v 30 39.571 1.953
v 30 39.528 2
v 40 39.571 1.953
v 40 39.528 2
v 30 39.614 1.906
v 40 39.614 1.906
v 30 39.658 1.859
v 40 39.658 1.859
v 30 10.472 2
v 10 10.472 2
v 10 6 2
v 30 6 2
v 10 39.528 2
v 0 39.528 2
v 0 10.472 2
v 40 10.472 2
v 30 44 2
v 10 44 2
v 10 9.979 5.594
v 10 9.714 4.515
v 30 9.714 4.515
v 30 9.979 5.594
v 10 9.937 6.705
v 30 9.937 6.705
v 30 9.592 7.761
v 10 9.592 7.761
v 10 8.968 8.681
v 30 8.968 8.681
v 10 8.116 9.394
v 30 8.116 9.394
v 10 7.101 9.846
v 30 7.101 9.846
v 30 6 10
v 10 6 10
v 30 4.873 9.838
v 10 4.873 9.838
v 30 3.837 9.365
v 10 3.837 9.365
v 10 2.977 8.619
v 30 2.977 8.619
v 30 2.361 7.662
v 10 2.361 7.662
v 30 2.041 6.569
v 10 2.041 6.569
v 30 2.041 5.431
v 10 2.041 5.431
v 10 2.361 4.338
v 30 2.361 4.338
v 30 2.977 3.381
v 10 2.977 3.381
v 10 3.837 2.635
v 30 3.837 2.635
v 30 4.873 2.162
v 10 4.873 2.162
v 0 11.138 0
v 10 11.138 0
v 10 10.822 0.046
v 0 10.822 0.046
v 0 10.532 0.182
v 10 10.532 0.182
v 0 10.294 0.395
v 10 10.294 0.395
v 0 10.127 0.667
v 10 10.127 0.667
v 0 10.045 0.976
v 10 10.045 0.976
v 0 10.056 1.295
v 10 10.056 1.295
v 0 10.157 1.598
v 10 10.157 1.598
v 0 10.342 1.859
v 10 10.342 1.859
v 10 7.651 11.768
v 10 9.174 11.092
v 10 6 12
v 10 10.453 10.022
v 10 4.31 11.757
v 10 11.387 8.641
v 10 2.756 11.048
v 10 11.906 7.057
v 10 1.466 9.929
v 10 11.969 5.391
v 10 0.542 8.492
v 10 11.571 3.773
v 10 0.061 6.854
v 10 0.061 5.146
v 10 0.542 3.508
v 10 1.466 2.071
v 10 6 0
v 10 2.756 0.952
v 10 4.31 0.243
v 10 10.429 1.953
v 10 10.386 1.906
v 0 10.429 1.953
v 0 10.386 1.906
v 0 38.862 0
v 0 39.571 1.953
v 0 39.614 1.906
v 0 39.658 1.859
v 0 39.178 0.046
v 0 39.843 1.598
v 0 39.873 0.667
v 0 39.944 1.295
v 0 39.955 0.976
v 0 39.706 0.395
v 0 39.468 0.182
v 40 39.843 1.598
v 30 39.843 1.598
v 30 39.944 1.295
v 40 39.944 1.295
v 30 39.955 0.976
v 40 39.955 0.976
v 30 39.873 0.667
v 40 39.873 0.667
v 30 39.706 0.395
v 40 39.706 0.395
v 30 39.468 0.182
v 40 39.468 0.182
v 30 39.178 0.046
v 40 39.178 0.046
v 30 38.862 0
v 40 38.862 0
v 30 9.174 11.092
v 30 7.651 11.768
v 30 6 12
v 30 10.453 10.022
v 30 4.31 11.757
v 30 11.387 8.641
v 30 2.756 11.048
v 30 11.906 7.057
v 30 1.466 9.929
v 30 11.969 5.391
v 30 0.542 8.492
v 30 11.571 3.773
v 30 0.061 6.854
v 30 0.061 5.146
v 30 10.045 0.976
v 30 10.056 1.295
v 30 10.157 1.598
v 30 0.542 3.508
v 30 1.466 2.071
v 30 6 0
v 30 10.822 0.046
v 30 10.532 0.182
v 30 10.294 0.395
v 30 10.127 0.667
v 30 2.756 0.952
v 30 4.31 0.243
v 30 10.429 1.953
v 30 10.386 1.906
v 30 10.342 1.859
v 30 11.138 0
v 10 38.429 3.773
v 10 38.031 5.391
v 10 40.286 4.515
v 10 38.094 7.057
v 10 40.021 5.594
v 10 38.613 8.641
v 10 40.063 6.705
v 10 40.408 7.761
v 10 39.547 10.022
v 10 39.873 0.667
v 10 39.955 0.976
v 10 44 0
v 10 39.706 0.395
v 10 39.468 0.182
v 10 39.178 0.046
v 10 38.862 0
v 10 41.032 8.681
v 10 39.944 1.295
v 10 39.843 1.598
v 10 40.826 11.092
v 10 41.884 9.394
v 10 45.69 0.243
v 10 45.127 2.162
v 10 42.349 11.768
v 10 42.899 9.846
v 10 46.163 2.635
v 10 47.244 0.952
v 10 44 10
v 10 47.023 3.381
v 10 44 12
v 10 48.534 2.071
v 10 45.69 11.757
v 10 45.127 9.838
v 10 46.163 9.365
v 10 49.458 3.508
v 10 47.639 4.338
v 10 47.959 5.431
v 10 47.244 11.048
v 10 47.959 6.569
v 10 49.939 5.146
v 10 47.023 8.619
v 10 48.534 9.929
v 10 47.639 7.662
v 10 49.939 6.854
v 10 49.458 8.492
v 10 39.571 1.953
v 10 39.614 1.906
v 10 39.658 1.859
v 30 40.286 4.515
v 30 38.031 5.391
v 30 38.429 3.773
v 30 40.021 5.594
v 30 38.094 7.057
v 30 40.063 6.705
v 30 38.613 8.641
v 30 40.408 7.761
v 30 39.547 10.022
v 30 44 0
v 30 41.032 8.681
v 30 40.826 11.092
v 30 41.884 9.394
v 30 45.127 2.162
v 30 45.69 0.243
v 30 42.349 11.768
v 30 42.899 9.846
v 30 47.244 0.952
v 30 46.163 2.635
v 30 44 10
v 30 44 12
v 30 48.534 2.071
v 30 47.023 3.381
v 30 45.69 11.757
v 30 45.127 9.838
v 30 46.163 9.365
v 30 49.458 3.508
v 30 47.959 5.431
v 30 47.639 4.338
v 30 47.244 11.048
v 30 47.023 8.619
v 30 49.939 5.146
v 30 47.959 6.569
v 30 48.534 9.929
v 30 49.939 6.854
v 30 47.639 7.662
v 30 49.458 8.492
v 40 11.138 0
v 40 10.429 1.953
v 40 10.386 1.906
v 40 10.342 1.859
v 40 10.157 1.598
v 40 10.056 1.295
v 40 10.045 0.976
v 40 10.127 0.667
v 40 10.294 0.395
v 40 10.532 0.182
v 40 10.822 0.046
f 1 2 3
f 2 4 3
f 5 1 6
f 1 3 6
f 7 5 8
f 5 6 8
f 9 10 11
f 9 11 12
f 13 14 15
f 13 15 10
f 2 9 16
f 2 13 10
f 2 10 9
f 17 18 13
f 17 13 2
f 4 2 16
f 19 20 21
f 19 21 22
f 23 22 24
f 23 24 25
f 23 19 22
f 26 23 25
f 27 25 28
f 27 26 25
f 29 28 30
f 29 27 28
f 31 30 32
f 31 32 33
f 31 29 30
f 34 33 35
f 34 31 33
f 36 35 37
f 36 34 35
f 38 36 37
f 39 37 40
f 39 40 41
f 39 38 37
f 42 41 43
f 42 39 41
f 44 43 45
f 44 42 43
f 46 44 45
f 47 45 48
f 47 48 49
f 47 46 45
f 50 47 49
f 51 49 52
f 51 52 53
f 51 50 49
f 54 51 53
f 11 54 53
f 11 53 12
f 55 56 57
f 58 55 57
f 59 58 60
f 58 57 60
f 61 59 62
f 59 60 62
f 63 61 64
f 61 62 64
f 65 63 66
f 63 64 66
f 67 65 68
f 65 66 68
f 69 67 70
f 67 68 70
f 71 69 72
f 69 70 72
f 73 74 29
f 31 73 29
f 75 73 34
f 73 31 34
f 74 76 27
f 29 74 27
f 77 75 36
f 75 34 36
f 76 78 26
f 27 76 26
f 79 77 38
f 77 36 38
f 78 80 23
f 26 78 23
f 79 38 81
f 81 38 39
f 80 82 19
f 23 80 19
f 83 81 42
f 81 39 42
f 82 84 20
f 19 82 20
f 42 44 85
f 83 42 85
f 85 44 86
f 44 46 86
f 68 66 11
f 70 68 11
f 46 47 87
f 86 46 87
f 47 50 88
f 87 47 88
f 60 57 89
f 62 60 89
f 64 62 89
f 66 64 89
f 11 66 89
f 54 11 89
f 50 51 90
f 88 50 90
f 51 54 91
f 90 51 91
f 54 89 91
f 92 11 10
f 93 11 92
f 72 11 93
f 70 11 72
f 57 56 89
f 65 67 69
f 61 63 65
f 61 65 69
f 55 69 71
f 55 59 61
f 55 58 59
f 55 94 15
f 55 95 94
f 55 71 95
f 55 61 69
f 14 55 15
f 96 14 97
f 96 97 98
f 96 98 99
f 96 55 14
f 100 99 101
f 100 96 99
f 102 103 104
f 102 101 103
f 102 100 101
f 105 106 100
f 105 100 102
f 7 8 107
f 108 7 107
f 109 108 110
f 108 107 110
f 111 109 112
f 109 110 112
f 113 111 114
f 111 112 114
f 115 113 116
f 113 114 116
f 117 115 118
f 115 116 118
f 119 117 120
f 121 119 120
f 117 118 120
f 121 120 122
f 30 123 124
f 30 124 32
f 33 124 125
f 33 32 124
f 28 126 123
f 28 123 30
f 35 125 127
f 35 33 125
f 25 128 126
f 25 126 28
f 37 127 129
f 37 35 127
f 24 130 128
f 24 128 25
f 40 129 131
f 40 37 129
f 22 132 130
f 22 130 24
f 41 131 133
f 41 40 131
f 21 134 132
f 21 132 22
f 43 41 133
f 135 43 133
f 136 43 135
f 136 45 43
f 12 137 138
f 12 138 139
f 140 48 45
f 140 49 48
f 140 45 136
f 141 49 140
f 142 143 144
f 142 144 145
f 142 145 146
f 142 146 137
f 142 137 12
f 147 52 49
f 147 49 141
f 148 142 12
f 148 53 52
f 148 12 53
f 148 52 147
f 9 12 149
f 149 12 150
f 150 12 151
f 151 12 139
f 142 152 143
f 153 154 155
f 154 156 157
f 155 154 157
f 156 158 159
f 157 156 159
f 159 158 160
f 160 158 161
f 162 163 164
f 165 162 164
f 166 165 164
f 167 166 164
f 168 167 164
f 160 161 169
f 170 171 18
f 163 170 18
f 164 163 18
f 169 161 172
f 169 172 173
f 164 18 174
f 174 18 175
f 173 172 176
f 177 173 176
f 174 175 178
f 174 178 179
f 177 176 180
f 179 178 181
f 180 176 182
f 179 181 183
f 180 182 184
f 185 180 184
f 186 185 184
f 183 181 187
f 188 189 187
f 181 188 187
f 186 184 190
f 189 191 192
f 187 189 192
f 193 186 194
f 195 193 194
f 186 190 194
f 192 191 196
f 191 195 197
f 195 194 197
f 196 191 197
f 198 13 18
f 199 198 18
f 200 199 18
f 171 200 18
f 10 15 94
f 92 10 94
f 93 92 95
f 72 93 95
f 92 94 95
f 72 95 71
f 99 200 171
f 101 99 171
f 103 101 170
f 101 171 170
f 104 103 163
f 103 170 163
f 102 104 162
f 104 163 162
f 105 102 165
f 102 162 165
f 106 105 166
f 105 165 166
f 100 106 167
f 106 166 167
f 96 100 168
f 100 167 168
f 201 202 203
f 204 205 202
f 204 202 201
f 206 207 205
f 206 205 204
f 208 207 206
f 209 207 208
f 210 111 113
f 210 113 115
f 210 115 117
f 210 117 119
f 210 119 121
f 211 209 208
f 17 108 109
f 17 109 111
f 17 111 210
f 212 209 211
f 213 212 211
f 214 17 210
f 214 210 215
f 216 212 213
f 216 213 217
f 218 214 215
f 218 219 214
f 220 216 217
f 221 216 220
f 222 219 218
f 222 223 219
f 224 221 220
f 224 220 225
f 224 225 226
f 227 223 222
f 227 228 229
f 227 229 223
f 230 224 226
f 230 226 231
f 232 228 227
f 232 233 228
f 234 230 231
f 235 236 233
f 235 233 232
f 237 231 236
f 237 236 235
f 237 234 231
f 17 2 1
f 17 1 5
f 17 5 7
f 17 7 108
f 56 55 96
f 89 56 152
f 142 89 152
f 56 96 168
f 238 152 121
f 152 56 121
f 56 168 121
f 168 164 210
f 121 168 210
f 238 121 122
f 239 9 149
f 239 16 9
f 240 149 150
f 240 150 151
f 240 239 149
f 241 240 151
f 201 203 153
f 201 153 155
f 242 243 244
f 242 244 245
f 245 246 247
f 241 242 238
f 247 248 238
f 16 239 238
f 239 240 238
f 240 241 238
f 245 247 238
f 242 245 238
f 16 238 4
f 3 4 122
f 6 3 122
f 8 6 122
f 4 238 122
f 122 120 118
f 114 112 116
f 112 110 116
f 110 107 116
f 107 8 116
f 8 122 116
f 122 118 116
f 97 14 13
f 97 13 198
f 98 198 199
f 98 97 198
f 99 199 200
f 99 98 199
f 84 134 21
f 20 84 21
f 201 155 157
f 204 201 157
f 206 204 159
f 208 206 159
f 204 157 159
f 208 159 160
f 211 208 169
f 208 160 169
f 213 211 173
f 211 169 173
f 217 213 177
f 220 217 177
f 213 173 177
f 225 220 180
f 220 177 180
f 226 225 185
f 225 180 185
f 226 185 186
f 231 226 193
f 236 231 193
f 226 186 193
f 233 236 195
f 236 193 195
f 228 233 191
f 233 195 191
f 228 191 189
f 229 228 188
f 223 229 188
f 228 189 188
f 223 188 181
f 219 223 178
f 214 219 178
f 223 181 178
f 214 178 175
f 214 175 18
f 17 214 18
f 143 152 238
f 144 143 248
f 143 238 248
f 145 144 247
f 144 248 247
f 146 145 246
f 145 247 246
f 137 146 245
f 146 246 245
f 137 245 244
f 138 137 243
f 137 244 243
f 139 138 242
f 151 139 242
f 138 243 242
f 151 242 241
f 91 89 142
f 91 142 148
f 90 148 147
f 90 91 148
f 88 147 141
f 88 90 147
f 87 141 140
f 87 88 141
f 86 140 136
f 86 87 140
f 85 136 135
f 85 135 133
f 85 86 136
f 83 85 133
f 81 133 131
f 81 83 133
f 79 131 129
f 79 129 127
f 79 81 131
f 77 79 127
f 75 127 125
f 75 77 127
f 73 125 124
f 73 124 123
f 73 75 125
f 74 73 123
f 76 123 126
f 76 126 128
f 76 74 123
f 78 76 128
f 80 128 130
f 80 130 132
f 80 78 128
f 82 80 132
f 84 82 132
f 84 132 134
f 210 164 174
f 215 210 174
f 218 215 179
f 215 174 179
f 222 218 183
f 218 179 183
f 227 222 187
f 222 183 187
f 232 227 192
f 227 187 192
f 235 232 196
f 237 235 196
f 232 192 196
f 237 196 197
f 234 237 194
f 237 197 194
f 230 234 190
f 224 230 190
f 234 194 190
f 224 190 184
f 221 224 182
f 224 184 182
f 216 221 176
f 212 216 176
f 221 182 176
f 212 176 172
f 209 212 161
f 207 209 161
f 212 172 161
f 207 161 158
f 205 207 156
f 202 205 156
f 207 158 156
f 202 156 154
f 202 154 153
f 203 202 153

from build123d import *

# Parameters (mm, degrees)
SKETCH1_W               = 40
SKETCH1_H               = 50
BOSS_EXTRUDE1_DEPTH     = 2
SKETCH3_W               = 40
SKETCH3_H               = 6
CUT_EXTRUDE3_DEPTH      = 3
SKETCH8_W               = 40
SKETCH8_H               = 6
CUT_EXTRUDE4_DEPTH      = 10
BOSS_EXTRUDE2_DEPTH     = 10
CUT_EXTRUDE5_START      = 10
SKETCH9_R               = 6
CUT_EXTRUDE5_DEPTH      = 10
MIRROR4_START           = 10
MIRROR4_COPY_1_SKETCH_R = 6
MIRROR4_COPY_1_DEPTH    = 10
FILLET1_R               = 1.1


with BuildPart() as part:
    # Sketch1 → Boss-Extrude1 (new body)
    with BuildSketch(Plane.XY):
        with Locations((20, 25)):
            Rectangle(SKETCH1_W, SKETCH1_H)
    extrude(amount=BOSS_EXTRUDE1_DEPTH)

    # Sketch3 → Cut-Extrude3 (cut)
    with BuildSketch(Plane.XY.offset(2)):
        with Locations((20, 3)):
            Rectangle(SKETCH3_W, SKETCH3_H)
    extrude(amount=-CUT_EXTRUDE3_DEPTH, mode=Mode.SUBTRACT)

    # Sketch8 → Cut-Extrude4 (cut)
    with BuildSketch(Plane.XY.offset(2)):
        with Locations((20, 47)):
            Rectangle(SKETCH8_W, SKETCH8_H)
    extrude(amount=-CUT_EXTRUDE4_DEPTH, mode=Mode.SUBTRACT)

    # Sketch6 → Boss-Extrude2 (add, symmetric)
    with BuildSketch(Plane(origin=(20, 0, -40), x_dir=(0, 0, 1), z_dir=(-1, 0, 0))):
        with BuildLine():
            Line((43.77260129, 11.571238192), (44.515067527, 9.714158794))
            ThreePointArc((44.515067527, 9.714158794), (48.242796258, 9.312078644), (50, 6))
            ThreePointArc((50, 6), (46, 2), (42, 6))
            Line((42, 6), (40, 6))
            ThreePointArc((40, 6), (46, 0), (52, 6))
            ThreePointArc((52, 6), (49.364194387, 10.968117966), (43.77260129, 11.571238192))
        make_face()
    boss_extrude2 = extrude(amount=BOSS_EXTRUDE2_DEPTH, both=True)

    # Mirror2: Boss-Extrude2 across plane
    add(boss_extrude2.mirror(Plane(origin=(0, 25, 0), x_dir=(0, 0, 1), z_dir=(0, -1, 0))))

    # Sketch9 → Cut-Extrude5 (cut)
    with BuildSketch(Plane.ZY.offset(-10).offset(CUT_EXTRUDE5_START)):
        with Locations((6, 6)):
            Circle(SKETCH9_R)
    cut_extrude5 = extrude(amount=-CUT_EXTRUDE5_DEPTH, mode=Mode.SUBTRACT)

    # Mirror3: Cut-Extrude5 across plane
    add(cut_extrude5.mirror(Plane(origin=(20, 0, 0), x_dir=(0, 0, 1), z_dir=(1, 0, 0))), mode=Mode.SUBTRACT)

    # Mirror4: Cut-Extrude5 across plane
    add(cut_extrude5.mirror(Plane(origin=(0, 25, 0), x_dir=(0, 0, 1), z_dir=(0, -1, 0))), mode=Mode.SUBTRACT)

    # Mirror4 copy 1 sketch → Mirror4 copy 1 (cut)
    with BuildSketch(Plane(origin=(30, 50, 0), x_dir=(0, 0, 1), z_dir=(1, 0, 0)).offset(MIRROR4_START)):
        with Locations((6, 6)):
            Circle(MIRROR4_COPY_1_SKETCH_R)
    extrude(amount=-MIRROR4_COPY_1_DEPTH, mode=Mode.SUBTRACT)

    # Fillet1
    # the kernel refuses this fillet: 1.1 mm, written as the material it takes off along each edge
    with BuildSketch(Plane(origin=(70.828558189, 6, 0), x_dir=(0, 0.9192771195538384, 0.393610946830494), z_dir=(-1, 0, 0)), Plane(origin=(10, 6, 0), x_dir=(0, 0.9192771195538384, 0.3936109468304938), z_dir=(-1, 0, 0))) as fillet1_piece_1:
        with BuildLine():
            CenterArc((5.156303403, 1.011204832), FILLET1_R, 113.179370495, 133.641259009)
            Line((4.723331362, 2.022409663), (4.714671921, 2.04263376))
            Line((4.714671921, 2.04263376), (-0.008659441, 0.020224097))
            Line((-0.008659441, 0.020224097), (0.008659441, -0.020224097))
            ThreePointArc((0.008659441, -0.020224097), (2.361665681, 0.462337283), (4.714671921, -0.020224097))
            Line((4.714671921, -0.020224097), (4.723331362, 0))
        make_face()
    extrude(amount=40.828558189, mode=Mode.SUBTRACT)
    with BuildSketch(Plane(origin=(70.828558189, 6, 0), x_dir=(0, 0.9192771195538384, 0.393610946830494), z_dir=(-1, 0, 0))) as fillet1_piece_2_section:
        with BuildLine():
            CenterArc((5.156303403, 1.011204832), FILLET1_R, 113.179370495, 133.641259009)
            Line((4.723331362, 2.022409663), (4.714671921, 2.04263376))
            Line((4.714671921, 2.04263376), (-0.008659441, 0.020224097))
            Line((-0.008659441, 0.020224097), (0.008659441, -0.020224097))
            ThreePointArc((0.008659441, -0.020224097), (2.361665681, 0.462337283), (4.714671921, -0.020224097))
            Line((4.714671921, -0.020224097), (4.723331362, 0))
        make_face()
    fillet1_piece_2 = extrude(amount=71.657116378, mode=Mode.PRIVATE)
    fillet1_piece_2 = split(fillet1_piece_2, bisect_by=Plane(origin=(10, 9.140941458, 0.431936904), z_dir=(-1, 0, 0)), keep=Keep.TOP, mode=Mode.PRIVATE)
    add(fillet1_piece_2, mode=Mode.SUBTRACT)
    with BuildSketch(Plane(origin=(70.828558189, 44, 0), x_dir=(0, -0.9192771195538351, 0.39361094683050163), z_dir=(-1, 0, 0)), Plane(origin=(10, 44, 0), x_dir=(0, -0.9192771195538407, 0.39361094683048864), z_dir=(-1, 0, 0))) as fillet1_piece_3:
        with BuildLine():
            CenterArc((5.156303403, -1.011204832), FILLET1_R, 113.179370495, 133.641259009)
            Line((4.723331362, -2.022409663), (4.714671921, -2.04263376))
            Line((4.714671921, -2.04263376), (-0.008659441, -0.020224097))
            Line((-0.008659441, -0.020224097), (0.008659441, 0.020224097))
            ThreePointArc((0.008659441, 0.020224097), (2.361665681, -0.462337283), (4.714671921, 0.020224097))
            Line((4.714671921, 0.020224097), (4.723331362, 0))
        make_face()
    extrude(amount=40.828558189, mode=Mode.SUBTRACT)
    with BuildSketch(Plane(origin=(70.828558189, 44, 0), x_dir=(0, -0.9192771195538351, 0.39361094683050163), z_dir=(-1, 0, 0))) as fillet1_piece_4_section:
        with BuildLine():
            CenterArc((5.156303403, -1.011204832), FILLET1_R, 113.179370495, 133.641259009)
            Line((4.723331362, -2.022409663), (4.714671921, -2.04263376))
            Line((4.714671921, -2.04263376), (-0.008659441, -0.020224097))
            Line((-0.008659441, -0.020224097), (0.008659441, 0.020224097))
            ThreePointArc((0.008659441, 0.020224097), (2.361665681, -0.462337283), (4.714671921, 0.020224097))
            Line((4.714671921, 0.020224097), (4.723331362, 0))
        make_face()
    fillet1_piece_4 = extrude(amount=71.657116378, mode=Mode.PRIVATE)
    fillet1_piece_4 = split(fillet1_piece_4, bisect_by=Plane(origin=(10, 40.859058542, 0.431936904), z_dir=(-1, 0, 0)), keep=Keep.TOP, mode=Mode.PRIVATE)
    add(fillet1_piece_4, mode=Mode.SUBTRACT)
    with BuildSketch(Plane(origin=(40.828558189, 6, 0), x_dir=(0, 0.9192771195538384, 0.393610946830494), z_dir=(-1, 0, 0))) as fillet1_piece_5_section:
        with BuildLine():
            CenterArc((5.156303403, 1.011204832), FILLET1_R, 113.179370495, 133.641259009)
            Line((4.723331362, 2.022409663), (4.714671921, 2.04263376))
            Line((4.714671921, 2.04263376), (-0.008659441, 0.020224097))
            Line((-0.008659441, 0.020224097), (0.008659441, -0.020224097))
            ThreePointArc((0.008659441, -0.020224097), (2.361665681, 0.462337283), (4.714671921, -0.020224097))
            Line((4.714671921, -0.020224097), (4.723331362, 0))
        make_face()
    fillet1_piece_5 = extrude(amount=71.657116378, mode=Mode.PRIVATE)
    fillet1_piece_5 = split(fillet1_piece_5, bisect_by=Plane(origin=(30, 9.140941458, 0.431936904), z_dir=(1, 0, 0)), keep=Keep.TOP, mode=Mode.PRIVATE)
    add(fillet1_piece_5, mode=Mode.SUBTRACT)
    with BuildSketch(Plane(origin=(40.828558189, 44, 0), x_dir=(0, -0.9192771195538353, 0.3936109468305011), z_dir=(-1, 0, 0))) as fillet1_piece_6_section:
        with BuildLine():
            CenterArc((5.156303403, -1.011204832), FILLET1_R, 113.179370495, 133.641259009)
            Line((4.723331362, -2.022409663), (4.714671921, -2.04263376))
            Line((4.714671921, -2.04263376), (-0.008659441, -0.020224097))
            Line((-0.008659441, -0.020224097), (0.008659441, 0.020224097))
            ThreePointArc((0.008659441, 0.020224097), (2.361665681, -0.462337283), (4.714671921, 0.020224097))
            Line((4.714671921, 0.020224097), (4.723331362, 0))
        make_face()
    fillet1_piece_6 = extrude(amount=71.657116378, mode=Mode.PRIVATE)
    fillet1_piece_6 = split(fillet1_piece_6, bisect_by=Plane(origin=(30, 40.859058542, 0.431936904), z_dir=(1, 0, 0)), keep=Keep.TOP, mode=Mode.PRIVATE)
    add(fillet1_piece_6, mode=Mode.SUBTRACT)


solid = part.part
